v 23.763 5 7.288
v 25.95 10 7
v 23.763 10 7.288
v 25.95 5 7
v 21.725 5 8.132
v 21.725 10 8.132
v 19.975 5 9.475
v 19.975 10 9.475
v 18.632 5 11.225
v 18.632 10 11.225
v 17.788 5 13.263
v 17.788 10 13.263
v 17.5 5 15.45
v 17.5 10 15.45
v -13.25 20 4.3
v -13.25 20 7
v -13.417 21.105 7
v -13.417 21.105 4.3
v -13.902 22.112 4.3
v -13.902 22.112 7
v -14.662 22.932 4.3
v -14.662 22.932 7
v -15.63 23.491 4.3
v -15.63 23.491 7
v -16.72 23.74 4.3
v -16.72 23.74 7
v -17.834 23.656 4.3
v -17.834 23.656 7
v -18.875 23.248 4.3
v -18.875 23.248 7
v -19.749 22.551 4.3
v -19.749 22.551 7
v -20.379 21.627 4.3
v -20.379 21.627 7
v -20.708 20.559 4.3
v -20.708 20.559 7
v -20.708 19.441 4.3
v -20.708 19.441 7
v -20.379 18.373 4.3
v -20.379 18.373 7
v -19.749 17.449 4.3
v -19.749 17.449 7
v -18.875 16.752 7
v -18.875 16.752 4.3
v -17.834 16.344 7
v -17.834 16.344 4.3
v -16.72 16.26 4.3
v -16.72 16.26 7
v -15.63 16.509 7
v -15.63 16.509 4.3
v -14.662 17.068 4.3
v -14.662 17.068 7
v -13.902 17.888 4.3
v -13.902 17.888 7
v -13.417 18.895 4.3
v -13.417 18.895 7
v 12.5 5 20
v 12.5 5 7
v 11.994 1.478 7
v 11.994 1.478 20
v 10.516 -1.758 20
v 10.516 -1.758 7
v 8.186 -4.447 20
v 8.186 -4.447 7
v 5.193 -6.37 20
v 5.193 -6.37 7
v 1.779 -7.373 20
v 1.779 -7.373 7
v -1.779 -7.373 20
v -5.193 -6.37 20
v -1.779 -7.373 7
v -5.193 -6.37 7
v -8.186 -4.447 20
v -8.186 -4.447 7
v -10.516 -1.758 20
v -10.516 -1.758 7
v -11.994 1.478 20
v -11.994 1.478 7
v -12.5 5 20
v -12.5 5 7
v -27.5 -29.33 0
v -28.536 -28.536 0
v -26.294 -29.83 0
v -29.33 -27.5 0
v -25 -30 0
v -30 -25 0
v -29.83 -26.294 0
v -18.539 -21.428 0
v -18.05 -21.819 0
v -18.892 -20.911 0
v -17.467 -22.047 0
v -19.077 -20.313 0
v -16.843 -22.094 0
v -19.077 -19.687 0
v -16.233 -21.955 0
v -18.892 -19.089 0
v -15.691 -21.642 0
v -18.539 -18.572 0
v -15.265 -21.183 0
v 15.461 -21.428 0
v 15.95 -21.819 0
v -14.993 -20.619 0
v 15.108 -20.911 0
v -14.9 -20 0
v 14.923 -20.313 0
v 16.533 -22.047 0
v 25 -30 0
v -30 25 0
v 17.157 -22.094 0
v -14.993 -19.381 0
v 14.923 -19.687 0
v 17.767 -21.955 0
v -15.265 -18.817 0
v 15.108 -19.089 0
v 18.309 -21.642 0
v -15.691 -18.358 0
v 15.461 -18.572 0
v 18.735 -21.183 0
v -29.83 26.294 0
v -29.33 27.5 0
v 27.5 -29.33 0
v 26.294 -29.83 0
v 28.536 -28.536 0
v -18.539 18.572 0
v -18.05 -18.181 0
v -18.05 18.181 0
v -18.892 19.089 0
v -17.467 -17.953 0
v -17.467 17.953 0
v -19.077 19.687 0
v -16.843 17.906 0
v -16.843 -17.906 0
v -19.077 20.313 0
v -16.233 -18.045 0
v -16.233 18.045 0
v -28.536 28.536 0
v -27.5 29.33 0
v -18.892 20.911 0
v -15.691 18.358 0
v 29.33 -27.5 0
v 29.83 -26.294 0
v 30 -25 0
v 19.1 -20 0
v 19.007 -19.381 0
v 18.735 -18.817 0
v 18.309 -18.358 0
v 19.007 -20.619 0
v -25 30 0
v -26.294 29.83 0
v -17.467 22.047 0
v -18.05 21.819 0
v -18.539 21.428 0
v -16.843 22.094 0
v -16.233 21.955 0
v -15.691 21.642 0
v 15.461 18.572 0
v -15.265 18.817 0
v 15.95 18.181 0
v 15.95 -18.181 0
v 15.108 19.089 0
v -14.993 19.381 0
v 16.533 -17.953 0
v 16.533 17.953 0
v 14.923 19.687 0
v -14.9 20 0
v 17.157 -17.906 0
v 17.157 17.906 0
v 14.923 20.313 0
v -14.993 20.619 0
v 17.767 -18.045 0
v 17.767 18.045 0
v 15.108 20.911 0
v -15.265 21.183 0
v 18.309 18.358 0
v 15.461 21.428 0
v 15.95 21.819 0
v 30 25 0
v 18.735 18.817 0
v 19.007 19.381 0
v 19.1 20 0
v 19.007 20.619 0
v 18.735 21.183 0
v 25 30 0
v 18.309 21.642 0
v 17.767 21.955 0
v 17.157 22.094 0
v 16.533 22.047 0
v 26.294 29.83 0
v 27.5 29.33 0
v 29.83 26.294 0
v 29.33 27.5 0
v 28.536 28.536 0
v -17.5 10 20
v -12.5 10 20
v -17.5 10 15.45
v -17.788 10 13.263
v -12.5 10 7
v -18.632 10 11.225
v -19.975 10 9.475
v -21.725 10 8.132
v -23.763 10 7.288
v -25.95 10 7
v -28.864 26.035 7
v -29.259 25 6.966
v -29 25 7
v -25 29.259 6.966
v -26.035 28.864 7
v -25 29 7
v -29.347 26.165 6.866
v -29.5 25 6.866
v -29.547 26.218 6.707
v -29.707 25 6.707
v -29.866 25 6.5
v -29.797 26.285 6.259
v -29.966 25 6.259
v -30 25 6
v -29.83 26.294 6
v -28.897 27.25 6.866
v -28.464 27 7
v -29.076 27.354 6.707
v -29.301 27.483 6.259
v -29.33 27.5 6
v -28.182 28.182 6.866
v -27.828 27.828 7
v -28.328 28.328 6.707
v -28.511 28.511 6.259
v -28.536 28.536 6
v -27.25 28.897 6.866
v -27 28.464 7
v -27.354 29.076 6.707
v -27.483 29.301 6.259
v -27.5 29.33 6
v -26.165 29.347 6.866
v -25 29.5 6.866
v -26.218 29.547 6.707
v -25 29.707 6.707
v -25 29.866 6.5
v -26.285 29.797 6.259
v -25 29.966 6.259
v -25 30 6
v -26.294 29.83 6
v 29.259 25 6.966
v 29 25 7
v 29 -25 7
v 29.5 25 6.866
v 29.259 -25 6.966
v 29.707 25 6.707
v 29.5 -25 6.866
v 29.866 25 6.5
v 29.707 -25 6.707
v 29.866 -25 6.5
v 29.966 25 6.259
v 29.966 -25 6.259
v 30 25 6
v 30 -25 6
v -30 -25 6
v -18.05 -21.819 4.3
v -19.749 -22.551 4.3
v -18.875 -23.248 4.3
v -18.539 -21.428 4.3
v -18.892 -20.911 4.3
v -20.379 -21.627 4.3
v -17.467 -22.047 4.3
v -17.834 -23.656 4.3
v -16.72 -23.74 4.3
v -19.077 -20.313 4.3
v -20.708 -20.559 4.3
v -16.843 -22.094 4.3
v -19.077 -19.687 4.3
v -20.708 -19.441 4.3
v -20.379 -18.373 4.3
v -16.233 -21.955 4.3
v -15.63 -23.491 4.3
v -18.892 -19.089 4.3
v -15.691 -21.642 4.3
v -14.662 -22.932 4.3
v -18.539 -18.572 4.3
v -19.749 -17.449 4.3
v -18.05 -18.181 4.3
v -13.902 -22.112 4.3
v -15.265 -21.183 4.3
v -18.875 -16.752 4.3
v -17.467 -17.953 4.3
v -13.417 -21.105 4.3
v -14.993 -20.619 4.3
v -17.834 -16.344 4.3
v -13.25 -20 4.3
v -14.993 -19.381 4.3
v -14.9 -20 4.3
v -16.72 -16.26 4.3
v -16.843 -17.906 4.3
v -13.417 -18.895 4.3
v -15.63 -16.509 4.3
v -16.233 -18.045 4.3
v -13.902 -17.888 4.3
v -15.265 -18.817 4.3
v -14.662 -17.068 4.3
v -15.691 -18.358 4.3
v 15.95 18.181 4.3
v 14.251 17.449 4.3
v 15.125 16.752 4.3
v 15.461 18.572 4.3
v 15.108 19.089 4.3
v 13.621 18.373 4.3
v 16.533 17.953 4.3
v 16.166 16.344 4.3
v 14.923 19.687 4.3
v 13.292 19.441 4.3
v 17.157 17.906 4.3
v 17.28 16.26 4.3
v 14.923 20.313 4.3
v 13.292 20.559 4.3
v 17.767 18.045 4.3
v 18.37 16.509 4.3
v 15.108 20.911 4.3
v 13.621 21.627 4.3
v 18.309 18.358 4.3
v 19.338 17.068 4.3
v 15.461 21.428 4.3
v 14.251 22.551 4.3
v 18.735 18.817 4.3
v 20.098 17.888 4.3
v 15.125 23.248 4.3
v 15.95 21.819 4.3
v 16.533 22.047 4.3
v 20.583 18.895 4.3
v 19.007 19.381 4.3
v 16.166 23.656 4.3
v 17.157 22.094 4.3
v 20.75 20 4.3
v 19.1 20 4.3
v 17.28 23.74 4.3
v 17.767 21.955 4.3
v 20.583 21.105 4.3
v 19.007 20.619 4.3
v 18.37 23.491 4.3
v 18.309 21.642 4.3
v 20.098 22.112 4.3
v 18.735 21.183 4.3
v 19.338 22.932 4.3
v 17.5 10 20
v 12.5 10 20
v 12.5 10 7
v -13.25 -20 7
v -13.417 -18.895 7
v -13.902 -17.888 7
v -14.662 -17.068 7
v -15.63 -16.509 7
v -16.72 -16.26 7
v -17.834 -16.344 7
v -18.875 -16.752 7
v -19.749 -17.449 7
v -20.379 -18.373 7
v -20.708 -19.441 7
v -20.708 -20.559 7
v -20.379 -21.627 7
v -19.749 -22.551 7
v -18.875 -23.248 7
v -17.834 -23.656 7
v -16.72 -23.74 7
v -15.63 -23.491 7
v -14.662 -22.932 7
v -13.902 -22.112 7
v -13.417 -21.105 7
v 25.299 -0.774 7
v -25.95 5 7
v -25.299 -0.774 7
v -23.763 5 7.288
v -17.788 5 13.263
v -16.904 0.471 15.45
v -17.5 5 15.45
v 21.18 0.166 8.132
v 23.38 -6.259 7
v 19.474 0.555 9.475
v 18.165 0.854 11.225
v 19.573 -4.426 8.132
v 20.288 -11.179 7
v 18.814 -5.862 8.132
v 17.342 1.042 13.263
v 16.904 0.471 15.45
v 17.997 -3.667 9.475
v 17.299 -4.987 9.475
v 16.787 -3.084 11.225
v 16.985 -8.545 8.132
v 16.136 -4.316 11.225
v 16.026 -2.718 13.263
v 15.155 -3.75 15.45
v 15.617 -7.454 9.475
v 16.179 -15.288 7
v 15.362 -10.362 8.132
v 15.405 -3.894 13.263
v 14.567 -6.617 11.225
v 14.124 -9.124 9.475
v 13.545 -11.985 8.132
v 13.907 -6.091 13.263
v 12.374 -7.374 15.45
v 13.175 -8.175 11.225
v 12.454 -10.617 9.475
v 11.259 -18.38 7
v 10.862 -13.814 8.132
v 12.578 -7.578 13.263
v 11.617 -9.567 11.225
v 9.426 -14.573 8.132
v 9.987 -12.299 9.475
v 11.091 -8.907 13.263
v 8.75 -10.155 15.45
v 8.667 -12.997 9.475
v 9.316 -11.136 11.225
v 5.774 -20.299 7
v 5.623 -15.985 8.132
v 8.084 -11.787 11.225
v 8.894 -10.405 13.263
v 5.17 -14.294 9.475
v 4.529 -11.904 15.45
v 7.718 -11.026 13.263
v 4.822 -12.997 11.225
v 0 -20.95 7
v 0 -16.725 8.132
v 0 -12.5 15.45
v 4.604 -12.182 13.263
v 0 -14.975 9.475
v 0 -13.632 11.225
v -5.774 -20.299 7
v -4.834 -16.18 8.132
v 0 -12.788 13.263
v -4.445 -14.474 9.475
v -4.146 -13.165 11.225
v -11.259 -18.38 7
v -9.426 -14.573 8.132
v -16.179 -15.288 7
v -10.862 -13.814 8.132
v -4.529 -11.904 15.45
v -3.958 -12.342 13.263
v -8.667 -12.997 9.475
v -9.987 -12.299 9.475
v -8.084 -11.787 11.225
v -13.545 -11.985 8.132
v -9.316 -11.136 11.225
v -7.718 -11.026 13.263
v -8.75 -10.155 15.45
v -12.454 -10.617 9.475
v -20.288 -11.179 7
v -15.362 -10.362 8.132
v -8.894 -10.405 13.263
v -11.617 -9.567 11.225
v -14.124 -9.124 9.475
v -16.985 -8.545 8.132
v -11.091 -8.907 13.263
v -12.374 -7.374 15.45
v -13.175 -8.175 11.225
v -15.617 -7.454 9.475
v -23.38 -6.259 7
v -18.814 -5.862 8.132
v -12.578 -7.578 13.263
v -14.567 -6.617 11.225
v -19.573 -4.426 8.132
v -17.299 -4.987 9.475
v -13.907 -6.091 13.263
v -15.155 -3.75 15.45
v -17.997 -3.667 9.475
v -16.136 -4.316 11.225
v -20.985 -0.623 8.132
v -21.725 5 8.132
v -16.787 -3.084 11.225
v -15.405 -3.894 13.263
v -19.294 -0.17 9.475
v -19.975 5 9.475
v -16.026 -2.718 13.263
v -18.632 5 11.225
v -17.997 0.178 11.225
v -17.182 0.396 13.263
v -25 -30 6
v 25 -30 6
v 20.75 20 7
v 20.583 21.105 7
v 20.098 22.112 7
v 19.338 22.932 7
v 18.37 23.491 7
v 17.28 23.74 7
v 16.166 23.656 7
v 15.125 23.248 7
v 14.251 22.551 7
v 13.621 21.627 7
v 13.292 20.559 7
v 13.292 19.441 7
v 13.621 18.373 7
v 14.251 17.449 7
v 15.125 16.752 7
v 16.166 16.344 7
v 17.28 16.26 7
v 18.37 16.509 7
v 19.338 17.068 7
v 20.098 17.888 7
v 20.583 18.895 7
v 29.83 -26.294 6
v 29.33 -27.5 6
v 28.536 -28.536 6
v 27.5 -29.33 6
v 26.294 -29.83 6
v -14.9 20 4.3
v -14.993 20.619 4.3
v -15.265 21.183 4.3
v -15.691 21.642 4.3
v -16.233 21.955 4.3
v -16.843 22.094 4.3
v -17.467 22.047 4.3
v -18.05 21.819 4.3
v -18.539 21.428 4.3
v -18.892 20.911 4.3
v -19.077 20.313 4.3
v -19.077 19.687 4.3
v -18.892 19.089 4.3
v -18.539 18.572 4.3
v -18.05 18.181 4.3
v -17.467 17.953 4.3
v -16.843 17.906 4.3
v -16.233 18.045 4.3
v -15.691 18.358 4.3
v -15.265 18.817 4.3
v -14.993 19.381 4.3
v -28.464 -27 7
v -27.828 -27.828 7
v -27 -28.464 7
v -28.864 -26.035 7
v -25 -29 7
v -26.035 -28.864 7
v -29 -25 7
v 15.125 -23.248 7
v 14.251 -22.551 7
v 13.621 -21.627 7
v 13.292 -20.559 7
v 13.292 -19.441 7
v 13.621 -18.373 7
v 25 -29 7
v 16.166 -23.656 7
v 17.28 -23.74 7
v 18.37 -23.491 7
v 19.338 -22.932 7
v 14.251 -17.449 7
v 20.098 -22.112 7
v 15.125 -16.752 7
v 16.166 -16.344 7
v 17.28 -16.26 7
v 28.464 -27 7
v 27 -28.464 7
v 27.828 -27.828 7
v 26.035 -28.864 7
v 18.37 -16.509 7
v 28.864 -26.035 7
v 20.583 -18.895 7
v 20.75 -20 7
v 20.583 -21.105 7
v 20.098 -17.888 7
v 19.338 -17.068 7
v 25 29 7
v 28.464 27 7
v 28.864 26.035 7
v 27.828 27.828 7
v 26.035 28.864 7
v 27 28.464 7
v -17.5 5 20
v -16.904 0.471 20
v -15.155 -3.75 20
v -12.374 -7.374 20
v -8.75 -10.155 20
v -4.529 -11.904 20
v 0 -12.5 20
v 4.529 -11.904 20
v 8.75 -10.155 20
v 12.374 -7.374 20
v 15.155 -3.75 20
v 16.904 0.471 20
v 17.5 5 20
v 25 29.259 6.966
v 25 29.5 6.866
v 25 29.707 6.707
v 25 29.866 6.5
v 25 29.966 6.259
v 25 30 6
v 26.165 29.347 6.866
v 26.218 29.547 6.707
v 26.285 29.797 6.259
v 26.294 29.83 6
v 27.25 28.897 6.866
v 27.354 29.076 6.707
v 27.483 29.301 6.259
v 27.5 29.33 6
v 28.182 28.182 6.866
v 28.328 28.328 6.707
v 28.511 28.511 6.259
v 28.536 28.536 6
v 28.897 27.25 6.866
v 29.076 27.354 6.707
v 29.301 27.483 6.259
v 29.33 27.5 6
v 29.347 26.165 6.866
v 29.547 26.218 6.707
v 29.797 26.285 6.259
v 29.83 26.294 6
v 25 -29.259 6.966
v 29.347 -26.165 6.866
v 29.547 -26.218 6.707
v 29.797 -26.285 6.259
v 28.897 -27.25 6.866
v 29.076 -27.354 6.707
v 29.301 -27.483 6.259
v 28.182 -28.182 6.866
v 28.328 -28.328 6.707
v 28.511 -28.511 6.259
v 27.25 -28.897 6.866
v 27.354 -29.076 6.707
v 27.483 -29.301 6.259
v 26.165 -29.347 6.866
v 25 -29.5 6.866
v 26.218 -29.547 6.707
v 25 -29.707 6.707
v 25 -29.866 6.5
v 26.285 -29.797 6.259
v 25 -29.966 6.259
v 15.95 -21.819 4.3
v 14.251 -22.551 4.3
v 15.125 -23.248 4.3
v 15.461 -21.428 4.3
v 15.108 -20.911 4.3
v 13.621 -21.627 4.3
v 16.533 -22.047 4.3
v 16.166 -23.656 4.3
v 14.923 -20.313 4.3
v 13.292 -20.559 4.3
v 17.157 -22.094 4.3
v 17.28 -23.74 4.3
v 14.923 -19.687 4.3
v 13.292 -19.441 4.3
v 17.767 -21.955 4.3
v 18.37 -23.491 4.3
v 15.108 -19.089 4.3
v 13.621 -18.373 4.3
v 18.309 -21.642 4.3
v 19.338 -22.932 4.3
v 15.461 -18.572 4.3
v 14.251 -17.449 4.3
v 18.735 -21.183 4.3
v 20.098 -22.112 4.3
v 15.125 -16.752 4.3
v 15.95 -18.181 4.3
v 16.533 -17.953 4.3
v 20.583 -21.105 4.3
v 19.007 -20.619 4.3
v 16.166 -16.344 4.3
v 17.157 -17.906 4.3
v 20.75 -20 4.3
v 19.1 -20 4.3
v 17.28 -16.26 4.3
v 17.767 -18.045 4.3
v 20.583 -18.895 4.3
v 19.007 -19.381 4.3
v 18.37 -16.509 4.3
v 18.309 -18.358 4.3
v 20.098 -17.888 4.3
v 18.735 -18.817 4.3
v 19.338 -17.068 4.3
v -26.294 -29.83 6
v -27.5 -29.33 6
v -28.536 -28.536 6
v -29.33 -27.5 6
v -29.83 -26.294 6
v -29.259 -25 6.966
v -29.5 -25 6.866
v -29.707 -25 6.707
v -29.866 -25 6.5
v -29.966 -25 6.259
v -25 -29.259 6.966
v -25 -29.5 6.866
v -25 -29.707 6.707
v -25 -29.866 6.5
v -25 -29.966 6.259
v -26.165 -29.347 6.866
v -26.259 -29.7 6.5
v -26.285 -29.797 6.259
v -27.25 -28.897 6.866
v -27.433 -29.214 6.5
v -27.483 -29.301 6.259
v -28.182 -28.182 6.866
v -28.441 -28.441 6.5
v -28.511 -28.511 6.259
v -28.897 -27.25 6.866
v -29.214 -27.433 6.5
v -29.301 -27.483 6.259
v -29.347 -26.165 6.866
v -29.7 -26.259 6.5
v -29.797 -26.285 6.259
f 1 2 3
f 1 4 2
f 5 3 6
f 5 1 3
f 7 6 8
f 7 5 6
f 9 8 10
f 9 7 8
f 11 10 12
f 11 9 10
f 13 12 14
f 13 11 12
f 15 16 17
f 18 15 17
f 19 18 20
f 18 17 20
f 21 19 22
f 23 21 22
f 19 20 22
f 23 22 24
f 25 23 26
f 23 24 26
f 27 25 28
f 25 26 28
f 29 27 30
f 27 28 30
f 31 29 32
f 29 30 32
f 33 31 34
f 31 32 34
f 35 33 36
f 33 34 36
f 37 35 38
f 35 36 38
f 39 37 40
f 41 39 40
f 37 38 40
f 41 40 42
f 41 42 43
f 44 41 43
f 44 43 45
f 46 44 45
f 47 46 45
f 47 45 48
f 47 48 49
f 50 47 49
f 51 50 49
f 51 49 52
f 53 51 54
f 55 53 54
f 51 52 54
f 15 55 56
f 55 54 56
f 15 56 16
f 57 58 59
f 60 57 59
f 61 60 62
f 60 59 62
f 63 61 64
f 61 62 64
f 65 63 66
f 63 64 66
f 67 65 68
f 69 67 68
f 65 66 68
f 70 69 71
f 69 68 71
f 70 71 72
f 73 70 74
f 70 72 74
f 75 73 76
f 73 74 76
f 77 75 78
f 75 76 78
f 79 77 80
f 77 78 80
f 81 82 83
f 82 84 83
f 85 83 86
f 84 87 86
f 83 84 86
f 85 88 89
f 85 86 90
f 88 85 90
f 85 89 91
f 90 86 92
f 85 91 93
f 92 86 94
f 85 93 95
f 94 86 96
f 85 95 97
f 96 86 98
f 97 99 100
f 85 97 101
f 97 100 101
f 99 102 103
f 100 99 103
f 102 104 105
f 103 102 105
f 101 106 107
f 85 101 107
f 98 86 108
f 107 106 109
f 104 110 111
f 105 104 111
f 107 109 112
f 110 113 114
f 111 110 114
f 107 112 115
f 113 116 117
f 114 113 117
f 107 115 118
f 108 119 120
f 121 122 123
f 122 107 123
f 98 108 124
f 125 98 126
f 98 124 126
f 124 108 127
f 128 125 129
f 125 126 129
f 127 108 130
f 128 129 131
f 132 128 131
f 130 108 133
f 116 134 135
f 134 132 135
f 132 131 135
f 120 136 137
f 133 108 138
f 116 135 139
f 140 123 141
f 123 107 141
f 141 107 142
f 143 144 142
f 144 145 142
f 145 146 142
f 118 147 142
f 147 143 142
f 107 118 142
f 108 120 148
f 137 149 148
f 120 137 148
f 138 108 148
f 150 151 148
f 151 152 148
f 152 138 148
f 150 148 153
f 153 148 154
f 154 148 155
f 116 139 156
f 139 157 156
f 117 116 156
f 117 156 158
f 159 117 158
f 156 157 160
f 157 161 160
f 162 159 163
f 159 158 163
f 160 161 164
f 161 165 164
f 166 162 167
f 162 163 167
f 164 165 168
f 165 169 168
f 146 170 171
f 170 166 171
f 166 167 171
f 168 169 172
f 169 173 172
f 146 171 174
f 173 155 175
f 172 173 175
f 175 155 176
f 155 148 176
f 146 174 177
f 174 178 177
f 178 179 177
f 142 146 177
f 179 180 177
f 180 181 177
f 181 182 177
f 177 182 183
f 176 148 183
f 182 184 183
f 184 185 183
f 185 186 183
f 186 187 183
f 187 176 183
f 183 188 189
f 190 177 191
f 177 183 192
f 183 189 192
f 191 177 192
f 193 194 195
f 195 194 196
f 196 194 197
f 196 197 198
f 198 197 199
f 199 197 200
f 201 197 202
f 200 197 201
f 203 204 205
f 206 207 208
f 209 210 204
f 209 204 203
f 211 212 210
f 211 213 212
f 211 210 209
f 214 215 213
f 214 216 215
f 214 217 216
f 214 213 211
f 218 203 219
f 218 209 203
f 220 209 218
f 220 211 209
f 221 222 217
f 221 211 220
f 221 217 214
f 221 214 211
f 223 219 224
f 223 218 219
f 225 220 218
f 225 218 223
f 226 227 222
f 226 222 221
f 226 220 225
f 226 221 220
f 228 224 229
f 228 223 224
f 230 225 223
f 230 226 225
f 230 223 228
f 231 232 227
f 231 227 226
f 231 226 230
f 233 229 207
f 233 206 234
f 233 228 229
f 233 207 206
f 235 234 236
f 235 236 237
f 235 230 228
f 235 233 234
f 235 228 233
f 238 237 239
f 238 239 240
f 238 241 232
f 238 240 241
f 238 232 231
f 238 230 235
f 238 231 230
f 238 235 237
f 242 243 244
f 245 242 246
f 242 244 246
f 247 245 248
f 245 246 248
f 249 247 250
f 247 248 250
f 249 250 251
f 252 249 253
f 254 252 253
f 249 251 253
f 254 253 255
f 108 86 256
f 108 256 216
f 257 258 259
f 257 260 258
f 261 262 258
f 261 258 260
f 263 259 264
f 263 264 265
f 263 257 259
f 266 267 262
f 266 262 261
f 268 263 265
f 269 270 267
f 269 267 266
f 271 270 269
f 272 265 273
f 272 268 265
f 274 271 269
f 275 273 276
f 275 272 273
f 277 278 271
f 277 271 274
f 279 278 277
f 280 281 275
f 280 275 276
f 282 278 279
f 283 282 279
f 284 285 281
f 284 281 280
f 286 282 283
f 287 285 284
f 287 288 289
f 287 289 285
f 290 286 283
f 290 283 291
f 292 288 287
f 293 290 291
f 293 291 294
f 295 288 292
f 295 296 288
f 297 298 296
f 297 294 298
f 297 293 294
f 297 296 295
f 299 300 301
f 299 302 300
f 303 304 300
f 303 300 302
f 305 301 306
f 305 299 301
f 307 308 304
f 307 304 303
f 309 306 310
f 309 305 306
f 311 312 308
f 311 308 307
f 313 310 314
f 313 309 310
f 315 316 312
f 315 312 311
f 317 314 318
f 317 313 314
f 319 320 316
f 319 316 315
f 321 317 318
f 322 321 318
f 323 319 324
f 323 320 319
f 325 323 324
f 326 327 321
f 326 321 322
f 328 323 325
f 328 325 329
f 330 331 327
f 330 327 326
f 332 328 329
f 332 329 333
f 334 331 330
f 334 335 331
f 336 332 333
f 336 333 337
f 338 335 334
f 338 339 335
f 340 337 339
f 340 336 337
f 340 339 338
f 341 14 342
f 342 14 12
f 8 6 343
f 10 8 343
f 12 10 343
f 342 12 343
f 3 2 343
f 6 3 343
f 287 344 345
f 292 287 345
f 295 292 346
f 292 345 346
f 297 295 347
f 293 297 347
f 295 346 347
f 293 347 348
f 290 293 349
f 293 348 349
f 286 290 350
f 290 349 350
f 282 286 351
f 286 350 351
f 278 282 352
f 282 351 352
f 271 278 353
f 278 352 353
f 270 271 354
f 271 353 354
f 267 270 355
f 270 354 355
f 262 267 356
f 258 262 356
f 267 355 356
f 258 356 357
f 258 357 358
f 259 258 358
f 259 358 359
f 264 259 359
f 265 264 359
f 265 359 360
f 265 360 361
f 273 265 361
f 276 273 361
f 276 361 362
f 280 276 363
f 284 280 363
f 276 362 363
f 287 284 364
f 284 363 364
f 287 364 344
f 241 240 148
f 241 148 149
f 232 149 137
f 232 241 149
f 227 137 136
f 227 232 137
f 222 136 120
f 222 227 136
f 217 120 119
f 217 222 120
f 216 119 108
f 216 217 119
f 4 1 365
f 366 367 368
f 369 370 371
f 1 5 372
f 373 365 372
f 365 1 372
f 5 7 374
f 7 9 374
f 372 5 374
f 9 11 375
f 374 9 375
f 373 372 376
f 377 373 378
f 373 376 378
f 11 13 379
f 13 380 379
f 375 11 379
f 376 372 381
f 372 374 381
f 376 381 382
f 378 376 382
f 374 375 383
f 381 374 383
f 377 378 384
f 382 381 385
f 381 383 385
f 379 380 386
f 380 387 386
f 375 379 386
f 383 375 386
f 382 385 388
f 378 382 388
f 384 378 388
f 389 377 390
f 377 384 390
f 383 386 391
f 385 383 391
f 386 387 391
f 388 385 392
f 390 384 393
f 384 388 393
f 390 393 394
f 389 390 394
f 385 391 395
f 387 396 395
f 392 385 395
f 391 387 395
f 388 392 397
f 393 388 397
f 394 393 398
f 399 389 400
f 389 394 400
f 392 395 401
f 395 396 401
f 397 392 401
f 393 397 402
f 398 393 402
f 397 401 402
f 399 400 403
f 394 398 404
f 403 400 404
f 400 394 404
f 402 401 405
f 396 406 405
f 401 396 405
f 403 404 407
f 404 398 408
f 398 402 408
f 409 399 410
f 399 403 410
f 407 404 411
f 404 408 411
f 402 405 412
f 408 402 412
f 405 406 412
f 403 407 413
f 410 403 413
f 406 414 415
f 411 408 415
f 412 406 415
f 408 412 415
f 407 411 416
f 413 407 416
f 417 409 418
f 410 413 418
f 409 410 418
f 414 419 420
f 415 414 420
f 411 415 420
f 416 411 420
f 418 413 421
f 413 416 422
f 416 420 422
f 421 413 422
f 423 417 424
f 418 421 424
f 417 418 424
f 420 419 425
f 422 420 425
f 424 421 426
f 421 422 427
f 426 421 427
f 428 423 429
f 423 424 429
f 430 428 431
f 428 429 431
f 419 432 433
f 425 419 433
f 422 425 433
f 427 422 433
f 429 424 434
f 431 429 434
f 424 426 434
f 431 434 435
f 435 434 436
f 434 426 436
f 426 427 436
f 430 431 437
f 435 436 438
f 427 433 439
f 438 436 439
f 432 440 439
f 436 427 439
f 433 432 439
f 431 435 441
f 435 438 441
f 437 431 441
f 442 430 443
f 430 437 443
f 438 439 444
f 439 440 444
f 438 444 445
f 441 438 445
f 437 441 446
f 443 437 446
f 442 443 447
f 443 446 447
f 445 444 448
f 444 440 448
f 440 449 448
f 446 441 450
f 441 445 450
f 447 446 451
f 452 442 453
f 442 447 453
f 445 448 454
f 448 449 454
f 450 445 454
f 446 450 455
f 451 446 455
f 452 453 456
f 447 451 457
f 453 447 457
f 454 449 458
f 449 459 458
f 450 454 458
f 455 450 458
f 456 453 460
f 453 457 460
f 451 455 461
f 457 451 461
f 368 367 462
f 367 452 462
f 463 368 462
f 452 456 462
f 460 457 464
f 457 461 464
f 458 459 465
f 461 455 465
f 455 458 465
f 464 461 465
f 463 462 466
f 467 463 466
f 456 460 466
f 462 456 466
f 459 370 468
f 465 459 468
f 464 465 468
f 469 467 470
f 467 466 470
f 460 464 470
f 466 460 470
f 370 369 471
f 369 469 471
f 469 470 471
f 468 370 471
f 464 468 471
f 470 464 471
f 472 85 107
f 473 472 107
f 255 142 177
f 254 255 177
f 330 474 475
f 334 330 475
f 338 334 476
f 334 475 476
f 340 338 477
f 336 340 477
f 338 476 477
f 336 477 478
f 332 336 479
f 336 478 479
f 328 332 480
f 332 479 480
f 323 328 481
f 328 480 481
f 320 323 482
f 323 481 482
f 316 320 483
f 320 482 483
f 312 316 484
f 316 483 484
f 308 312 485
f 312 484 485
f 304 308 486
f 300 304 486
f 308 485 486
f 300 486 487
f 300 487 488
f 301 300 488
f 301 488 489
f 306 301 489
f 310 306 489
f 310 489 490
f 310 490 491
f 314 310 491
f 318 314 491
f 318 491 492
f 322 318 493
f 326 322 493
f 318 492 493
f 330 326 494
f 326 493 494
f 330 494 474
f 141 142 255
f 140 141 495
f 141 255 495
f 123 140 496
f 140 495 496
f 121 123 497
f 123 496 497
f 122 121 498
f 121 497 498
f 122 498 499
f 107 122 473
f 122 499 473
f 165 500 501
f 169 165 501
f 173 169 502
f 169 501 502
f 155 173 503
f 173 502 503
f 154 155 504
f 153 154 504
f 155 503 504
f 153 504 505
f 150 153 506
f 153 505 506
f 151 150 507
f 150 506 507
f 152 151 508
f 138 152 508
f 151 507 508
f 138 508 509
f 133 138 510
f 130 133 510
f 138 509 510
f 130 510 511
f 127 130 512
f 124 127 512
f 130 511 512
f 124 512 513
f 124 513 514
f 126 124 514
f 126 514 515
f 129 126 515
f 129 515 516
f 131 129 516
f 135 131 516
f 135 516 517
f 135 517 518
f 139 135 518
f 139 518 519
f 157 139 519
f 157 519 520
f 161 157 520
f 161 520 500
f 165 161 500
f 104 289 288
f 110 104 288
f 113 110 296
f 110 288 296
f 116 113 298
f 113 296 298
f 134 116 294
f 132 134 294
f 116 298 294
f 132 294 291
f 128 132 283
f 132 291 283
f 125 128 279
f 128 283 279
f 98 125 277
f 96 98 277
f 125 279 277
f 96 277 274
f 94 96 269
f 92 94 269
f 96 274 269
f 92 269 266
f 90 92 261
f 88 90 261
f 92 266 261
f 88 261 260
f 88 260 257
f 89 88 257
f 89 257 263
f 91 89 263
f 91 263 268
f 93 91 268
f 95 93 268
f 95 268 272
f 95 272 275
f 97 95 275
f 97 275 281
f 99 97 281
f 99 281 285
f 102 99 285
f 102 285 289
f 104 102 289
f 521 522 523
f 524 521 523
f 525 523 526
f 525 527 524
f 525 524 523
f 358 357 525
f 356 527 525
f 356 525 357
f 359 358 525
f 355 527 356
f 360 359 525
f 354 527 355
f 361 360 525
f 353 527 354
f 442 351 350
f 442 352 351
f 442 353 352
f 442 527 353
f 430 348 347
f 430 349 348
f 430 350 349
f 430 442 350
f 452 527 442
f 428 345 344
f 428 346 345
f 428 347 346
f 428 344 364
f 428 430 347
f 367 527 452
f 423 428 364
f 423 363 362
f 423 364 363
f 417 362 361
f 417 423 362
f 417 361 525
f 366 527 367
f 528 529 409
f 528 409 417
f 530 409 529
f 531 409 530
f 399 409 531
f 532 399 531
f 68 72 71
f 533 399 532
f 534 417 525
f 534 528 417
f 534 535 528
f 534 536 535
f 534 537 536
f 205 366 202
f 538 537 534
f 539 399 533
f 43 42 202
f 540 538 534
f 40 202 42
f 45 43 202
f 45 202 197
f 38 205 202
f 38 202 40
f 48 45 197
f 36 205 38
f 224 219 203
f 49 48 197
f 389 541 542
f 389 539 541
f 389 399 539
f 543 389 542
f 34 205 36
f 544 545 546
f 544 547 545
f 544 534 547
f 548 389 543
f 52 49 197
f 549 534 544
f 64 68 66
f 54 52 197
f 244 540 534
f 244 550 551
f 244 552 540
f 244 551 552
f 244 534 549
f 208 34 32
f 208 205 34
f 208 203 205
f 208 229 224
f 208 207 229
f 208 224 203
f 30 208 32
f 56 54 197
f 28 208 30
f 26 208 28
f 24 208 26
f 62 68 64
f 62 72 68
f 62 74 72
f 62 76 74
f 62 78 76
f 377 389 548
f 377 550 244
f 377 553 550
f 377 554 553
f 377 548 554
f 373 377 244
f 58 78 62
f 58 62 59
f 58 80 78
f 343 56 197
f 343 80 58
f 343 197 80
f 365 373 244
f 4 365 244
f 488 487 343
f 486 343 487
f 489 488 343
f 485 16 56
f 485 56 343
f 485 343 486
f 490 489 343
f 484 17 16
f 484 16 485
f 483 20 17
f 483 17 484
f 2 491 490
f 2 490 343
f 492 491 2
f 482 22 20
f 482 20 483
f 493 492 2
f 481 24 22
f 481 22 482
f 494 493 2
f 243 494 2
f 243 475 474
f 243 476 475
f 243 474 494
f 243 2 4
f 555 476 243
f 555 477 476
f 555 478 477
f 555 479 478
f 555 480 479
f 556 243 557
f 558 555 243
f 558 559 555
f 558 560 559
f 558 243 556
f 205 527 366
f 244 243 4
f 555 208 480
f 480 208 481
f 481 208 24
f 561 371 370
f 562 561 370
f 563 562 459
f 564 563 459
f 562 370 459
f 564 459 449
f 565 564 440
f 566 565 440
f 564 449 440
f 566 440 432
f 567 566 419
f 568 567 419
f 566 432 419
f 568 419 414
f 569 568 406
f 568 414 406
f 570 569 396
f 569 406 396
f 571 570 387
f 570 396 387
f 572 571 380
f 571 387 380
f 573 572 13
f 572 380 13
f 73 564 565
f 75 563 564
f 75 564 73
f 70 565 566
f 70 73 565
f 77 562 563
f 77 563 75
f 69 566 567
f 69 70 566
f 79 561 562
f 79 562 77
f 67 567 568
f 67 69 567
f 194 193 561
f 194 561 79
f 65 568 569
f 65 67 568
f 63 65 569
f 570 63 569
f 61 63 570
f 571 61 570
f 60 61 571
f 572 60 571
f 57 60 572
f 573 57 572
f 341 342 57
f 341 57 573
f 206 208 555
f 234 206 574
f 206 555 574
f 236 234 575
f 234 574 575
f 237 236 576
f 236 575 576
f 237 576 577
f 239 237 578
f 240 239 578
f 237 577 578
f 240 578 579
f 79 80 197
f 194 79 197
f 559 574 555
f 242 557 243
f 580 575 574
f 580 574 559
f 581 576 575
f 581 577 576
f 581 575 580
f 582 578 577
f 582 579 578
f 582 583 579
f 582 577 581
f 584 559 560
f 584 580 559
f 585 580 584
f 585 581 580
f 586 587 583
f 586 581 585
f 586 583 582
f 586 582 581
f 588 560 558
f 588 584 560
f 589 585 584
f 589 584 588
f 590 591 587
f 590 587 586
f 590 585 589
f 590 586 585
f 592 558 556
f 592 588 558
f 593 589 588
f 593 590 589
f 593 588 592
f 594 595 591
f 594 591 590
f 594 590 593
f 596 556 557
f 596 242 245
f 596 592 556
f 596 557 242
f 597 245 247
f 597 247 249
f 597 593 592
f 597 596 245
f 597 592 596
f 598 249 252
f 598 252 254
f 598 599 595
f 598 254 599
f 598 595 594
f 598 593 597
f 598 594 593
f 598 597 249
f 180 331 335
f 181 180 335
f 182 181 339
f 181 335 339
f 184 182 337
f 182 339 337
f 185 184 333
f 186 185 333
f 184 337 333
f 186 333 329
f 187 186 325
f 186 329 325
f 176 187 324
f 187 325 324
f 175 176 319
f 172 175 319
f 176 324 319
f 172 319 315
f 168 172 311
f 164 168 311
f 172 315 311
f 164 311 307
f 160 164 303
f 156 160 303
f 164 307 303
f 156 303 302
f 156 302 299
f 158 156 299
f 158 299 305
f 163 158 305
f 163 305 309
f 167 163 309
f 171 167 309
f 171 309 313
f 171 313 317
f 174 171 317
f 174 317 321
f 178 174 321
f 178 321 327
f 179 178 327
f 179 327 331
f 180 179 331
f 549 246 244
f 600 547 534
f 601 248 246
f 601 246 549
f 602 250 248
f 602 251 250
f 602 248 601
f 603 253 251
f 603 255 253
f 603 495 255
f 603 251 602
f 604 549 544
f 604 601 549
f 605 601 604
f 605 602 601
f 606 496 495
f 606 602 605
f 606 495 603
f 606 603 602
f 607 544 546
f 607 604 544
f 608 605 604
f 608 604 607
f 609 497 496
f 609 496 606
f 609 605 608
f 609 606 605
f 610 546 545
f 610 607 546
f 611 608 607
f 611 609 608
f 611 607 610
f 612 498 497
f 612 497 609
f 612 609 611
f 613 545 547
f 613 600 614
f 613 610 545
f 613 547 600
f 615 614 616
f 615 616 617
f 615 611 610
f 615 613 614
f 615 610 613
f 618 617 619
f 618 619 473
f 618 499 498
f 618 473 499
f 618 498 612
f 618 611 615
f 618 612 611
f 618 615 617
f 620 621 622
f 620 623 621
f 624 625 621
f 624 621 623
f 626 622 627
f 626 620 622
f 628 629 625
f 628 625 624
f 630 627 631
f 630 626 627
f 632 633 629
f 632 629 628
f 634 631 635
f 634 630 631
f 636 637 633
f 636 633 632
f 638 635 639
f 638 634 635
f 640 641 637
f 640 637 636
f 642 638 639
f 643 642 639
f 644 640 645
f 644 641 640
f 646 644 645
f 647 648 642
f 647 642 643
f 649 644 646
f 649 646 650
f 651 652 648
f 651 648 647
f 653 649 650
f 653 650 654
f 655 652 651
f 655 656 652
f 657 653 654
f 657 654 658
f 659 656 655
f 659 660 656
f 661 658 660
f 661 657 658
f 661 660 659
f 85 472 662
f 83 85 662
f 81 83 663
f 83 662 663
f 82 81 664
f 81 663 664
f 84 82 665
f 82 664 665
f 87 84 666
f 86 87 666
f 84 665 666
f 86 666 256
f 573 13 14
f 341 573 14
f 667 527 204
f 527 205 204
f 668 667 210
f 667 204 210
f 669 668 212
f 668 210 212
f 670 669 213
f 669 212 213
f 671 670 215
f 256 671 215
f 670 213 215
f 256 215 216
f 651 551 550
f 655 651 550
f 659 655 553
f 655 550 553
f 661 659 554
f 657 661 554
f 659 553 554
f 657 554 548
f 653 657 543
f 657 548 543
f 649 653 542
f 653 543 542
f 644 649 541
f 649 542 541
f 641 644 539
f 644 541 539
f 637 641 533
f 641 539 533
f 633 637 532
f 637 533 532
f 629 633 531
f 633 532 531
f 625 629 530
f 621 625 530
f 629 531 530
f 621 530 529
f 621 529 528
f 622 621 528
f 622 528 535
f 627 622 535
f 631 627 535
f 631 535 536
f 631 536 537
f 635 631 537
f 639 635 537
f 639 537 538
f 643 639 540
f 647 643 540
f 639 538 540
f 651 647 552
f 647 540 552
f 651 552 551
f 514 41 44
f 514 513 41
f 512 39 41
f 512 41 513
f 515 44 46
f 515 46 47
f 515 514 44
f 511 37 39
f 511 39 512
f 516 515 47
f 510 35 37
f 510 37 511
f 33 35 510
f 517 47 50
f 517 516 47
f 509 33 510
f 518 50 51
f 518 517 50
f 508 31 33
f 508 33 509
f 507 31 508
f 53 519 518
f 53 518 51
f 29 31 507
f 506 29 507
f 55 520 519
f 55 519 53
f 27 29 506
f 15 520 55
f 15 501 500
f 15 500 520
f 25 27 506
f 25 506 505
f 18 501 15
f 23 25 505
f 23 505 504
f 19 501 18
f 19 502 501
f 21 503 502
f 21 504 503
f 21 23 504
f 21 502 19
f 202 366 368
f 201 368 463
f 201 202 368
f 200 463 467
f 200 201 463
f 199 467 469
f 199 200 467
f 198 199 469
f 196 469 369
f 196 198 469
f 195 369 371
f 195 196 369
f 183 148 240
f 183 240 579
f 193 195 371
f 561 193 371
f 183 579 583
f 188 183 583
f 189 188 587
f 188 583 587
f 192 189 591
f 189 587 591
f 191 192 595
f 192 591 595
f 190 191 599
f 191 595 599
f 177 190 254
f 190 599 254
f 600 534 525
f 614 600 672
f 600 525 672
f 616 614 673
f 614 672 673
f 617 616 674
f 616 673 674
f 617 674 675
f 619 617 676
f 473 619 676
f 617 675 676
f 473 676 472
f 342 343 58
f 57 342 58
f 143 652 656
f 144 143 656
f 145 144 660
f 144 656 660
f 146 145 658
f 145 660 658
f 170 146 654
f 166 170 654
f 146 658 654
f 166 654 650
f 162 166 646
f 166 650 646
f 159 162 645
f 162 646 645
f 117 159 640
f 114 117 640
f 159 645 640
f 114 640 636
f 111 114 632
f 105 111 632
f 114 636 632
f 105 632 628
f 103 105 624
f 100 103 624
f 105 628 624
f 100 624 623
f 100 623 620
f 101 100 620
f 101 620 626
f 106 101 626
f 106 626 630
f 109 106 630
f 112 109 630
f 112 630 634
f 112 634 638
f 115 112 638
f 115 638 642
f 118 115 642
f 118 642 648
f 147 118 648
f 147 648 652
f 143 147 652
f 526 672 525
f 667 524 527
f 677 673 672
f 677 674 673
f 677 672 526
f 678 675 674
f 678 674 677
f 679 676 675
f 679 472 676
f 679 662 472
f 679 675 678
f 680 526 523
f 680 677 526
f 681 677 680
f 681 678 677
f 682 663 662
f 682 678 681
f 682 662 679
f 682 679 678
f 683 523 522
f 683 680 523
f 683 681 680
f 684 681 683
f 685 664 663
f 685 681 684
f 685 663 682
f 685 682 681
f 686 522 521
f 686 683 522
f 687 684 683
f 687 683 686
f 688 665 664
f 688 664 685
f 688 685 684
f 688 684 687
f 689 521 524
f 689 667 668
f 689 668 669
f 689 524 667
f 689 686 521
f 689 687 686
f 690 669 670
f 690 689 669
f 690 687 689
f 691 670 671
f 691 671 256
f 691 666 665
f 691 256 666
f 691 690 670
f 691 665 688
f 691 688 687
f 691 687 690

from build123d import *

# Parameters (mm, degrees)
F0_W     = 60
F0_H     = 60
F1_DEPTH = 7
F2_DEPTH = 20
F3_R     = 8.4497474683
F4_R     = 5
F5_R     = 1
F6_R     = 2.1
F7_DEPTH = 25
F6_R_2   = 3.75
F8_DEPTH = 2.7


# Not quite as in the source:
# - a feature names something its author has since deleted; it is built from what else it names


with BuildPart() as f1:
    # F0 (on Top) → F1 (new body)
    with BuildSketch(Plane.XY):
        Rectangle(F0_W, F0_H)
        with BuildLine():
            ThreePointArc((-16.7705098312, 10), (0, 22.5), (16.7705098312, 10))
            Line((16.7705098312, 10), (17.5, 10))
            Line((17.5, 10), (17.5, 5))
            ThreePointArc((17.5, 5), (0, -12.5), (-17.5, 5))
            Line((-17.5, 5), (-17.5, 10))
            Line((-17.5, 10), (-16.7705098312, 10))
        make_face(mode=Mode.SUBTRACT)
        with BuildLine():
            ThreePointArc((-12.5, 5), (0, -7.5), (12.5, 5))
            ThreePointArc((12.5, 5), (0, 17.5), (-12.5, 5))
        make_face()
        with BuildLine():
            ThreePointArc((-12.5, 5), (0, 17.5), (12.5, 5))
            Line((12.5, 5), (12.5, 10))
            Line((12.5, 10), (16.7705098312, 10))
            ThreePointArc((16.7705098312, 10), (0, 22.5), (-16.7705098312, 10))
            Line((-16.7705098312, 10), (-12.5, 10))
            Line((-12.5, 10), (-12.5, 5))
        make_face()
        with BuildLine():
            Line((12.5, 10), (12.5, 5))
            ThreePointArc((12.5, 5), (0, -7.5), (-12.5, 5))
            Line((-12.5, 5), (-12.5, 10))
            Line((-12.5, 10), (-16.7705098312, 10))
            ThreePointArc((-16.7705098312, 10), (-17.3166671454, 7.5264676876), (-17.5, 5))
            ThreePointArc((-17.5, 5), (0, -12.5), (17.5, 5))
            ThreePointArc((17.5, 5), (17.3166671454, 7.5264676876), (16.7705098312, 10))
            Line((16.7705098312, 10), (12.5, 10))
        make_face()
        with BuildLine():
            ThreePointArc((-17.5, 5), (-17.3166671454, 7.5264676876), (-16.7705098312, 10))
            Line((-16.7705098312, 10), (-17.5, 10))
            Line((-17.5, 10), (-17.5, 5))
        make_face()
        with BuildLine():
            Line((17.5, 10), (16.7705098312, 10))
            ThreePointArc((16.7705098312, 10), (17.3166671454, 7.5264676876), (17.5, 5))
            Line((17.5, 5), (17.5, 10))
        make_face()
    extrude(amount=F1_DEPTH)

    # F0 (on Top) → F2 (join)
    with BuildSketch(Plane.XY):
        with BuildLine():
            Line((12.5, 10), (12.5, 5))
            ThreePointArc((12.5, 5), (0, -7.5), (-12.5, 5))
            Line((-12.5, 5), (-12.5, 10))
            Line((-12.5, 10), (-16.7705098312, 10))
            ThreePointArc((-16.7705098312, 10), (-17.3166671454, 7.5264676876), (-17.5, 5))
            ThreePointArc((-17.5, 5), (0, -12.5), (17.5, 5))
            ThreePointArc((17.5, 5), (17.3166671454, 7.5264676876), (16.7705098312, 10))
            Line((16.7705098312, 10), (12.5, 10))
        make_face()
        with BuildLine():
            Line((17.5, 10), (16.7705098312, 10))
            ThreePointArc((16.7705098312, 10), (17.3166671454, 7.5264676876), (17.5, 5))
            Line((17.5, 5), (17.5, 10))
        make_face()
        with BuildLine():
            ThreePointArc((-17.5, 5), (-17.3166671454, 7.5264676876), (-16.7705098312, 10))
            Line((-16.7705098312, 10), (-17.5, 10))
            Line((-17.5, 10), (-17.5, 5))
        make_face()
    extrude(amount=F2_DEPTH)

    # F3
    f3_edges = [f1.edges().sort_by_distance(p)[0] for p in [
        (0, -12.5, 7),
        (-17.5, 7.5, 7),
        (17.5, 7.5, 7),
    ]]
    fillet(f3_edges, radius=F3_R)

    # F4
    f4_edges = [f1.edges().sort_by_distance(p)[0] for p in [
        (30, -30, 3.5),
        (-30, -30, 3.5),
        (-30, 30, 3.5),
        (30, 30, 3.5),
    ]]
    fillet(f4_edges, radius=F4_R)

    # F5
    f5_edges = [f1.edges().sort_by_distance(p)[0] for p in [
        (-30, 0, 7),
        (-28.535534, 28.535534, 7),
        (0, 30, 7),
        (30, 0, 7),
        (28.535534, 28.535534, 7),
        (0, -30, 7),
        (-28.535534, -28.535534, 7),
        (28.535534, -28.535534, 7),
    ]]
    fillet(f5_edges, radius=F5_R)

    # F6 (on face) → F7 (cut)
    with BuildSketch(Plane.XY.offset(7)):
        with Locations((-17, 20)):
            Circle(F6_R)
        with Locations((17, 20)):
            Circle(F6_R)
        with Locations((-17, -20)):
            Circle(F6_R)
        with Locations((17, -20)):
            Circle(F6_R)
    extrude(amount=-F7_DEPTH, mode=Mode.SUBTRACT)

    # F6 (on face) → F8 (cut)
    with BuildSketch(Plane.XY.offset(7)):
        with Locations((-17, 20)):
            Circle(F6_R_2)
        with Locations((-17, 20)):
            Circle(F6_R, mode=Mode.SUBTRACT)
        with Locations((17, 20)):
            Circle(F6_R_2)
        with Locations((17, 20)):
            Circle(F6_R, mode=Mode.SUBTRACT)
        with Locations((-17, -20)):
            Circle(F6_R_2)
        with Locations((-17, -20)):
            Circle(F6_R, mode=Mode.SUBTRACT)
        with Locations((17, -20)):
            Circle(F6_R_2)
        with Locations((17, -20)):
            Circle(F6_R, mode=Mode.SUBTRACT)
    extrude(amount=-F8_DEPTH, mode=Mode.SUBTRACT)


solid = f1.part
